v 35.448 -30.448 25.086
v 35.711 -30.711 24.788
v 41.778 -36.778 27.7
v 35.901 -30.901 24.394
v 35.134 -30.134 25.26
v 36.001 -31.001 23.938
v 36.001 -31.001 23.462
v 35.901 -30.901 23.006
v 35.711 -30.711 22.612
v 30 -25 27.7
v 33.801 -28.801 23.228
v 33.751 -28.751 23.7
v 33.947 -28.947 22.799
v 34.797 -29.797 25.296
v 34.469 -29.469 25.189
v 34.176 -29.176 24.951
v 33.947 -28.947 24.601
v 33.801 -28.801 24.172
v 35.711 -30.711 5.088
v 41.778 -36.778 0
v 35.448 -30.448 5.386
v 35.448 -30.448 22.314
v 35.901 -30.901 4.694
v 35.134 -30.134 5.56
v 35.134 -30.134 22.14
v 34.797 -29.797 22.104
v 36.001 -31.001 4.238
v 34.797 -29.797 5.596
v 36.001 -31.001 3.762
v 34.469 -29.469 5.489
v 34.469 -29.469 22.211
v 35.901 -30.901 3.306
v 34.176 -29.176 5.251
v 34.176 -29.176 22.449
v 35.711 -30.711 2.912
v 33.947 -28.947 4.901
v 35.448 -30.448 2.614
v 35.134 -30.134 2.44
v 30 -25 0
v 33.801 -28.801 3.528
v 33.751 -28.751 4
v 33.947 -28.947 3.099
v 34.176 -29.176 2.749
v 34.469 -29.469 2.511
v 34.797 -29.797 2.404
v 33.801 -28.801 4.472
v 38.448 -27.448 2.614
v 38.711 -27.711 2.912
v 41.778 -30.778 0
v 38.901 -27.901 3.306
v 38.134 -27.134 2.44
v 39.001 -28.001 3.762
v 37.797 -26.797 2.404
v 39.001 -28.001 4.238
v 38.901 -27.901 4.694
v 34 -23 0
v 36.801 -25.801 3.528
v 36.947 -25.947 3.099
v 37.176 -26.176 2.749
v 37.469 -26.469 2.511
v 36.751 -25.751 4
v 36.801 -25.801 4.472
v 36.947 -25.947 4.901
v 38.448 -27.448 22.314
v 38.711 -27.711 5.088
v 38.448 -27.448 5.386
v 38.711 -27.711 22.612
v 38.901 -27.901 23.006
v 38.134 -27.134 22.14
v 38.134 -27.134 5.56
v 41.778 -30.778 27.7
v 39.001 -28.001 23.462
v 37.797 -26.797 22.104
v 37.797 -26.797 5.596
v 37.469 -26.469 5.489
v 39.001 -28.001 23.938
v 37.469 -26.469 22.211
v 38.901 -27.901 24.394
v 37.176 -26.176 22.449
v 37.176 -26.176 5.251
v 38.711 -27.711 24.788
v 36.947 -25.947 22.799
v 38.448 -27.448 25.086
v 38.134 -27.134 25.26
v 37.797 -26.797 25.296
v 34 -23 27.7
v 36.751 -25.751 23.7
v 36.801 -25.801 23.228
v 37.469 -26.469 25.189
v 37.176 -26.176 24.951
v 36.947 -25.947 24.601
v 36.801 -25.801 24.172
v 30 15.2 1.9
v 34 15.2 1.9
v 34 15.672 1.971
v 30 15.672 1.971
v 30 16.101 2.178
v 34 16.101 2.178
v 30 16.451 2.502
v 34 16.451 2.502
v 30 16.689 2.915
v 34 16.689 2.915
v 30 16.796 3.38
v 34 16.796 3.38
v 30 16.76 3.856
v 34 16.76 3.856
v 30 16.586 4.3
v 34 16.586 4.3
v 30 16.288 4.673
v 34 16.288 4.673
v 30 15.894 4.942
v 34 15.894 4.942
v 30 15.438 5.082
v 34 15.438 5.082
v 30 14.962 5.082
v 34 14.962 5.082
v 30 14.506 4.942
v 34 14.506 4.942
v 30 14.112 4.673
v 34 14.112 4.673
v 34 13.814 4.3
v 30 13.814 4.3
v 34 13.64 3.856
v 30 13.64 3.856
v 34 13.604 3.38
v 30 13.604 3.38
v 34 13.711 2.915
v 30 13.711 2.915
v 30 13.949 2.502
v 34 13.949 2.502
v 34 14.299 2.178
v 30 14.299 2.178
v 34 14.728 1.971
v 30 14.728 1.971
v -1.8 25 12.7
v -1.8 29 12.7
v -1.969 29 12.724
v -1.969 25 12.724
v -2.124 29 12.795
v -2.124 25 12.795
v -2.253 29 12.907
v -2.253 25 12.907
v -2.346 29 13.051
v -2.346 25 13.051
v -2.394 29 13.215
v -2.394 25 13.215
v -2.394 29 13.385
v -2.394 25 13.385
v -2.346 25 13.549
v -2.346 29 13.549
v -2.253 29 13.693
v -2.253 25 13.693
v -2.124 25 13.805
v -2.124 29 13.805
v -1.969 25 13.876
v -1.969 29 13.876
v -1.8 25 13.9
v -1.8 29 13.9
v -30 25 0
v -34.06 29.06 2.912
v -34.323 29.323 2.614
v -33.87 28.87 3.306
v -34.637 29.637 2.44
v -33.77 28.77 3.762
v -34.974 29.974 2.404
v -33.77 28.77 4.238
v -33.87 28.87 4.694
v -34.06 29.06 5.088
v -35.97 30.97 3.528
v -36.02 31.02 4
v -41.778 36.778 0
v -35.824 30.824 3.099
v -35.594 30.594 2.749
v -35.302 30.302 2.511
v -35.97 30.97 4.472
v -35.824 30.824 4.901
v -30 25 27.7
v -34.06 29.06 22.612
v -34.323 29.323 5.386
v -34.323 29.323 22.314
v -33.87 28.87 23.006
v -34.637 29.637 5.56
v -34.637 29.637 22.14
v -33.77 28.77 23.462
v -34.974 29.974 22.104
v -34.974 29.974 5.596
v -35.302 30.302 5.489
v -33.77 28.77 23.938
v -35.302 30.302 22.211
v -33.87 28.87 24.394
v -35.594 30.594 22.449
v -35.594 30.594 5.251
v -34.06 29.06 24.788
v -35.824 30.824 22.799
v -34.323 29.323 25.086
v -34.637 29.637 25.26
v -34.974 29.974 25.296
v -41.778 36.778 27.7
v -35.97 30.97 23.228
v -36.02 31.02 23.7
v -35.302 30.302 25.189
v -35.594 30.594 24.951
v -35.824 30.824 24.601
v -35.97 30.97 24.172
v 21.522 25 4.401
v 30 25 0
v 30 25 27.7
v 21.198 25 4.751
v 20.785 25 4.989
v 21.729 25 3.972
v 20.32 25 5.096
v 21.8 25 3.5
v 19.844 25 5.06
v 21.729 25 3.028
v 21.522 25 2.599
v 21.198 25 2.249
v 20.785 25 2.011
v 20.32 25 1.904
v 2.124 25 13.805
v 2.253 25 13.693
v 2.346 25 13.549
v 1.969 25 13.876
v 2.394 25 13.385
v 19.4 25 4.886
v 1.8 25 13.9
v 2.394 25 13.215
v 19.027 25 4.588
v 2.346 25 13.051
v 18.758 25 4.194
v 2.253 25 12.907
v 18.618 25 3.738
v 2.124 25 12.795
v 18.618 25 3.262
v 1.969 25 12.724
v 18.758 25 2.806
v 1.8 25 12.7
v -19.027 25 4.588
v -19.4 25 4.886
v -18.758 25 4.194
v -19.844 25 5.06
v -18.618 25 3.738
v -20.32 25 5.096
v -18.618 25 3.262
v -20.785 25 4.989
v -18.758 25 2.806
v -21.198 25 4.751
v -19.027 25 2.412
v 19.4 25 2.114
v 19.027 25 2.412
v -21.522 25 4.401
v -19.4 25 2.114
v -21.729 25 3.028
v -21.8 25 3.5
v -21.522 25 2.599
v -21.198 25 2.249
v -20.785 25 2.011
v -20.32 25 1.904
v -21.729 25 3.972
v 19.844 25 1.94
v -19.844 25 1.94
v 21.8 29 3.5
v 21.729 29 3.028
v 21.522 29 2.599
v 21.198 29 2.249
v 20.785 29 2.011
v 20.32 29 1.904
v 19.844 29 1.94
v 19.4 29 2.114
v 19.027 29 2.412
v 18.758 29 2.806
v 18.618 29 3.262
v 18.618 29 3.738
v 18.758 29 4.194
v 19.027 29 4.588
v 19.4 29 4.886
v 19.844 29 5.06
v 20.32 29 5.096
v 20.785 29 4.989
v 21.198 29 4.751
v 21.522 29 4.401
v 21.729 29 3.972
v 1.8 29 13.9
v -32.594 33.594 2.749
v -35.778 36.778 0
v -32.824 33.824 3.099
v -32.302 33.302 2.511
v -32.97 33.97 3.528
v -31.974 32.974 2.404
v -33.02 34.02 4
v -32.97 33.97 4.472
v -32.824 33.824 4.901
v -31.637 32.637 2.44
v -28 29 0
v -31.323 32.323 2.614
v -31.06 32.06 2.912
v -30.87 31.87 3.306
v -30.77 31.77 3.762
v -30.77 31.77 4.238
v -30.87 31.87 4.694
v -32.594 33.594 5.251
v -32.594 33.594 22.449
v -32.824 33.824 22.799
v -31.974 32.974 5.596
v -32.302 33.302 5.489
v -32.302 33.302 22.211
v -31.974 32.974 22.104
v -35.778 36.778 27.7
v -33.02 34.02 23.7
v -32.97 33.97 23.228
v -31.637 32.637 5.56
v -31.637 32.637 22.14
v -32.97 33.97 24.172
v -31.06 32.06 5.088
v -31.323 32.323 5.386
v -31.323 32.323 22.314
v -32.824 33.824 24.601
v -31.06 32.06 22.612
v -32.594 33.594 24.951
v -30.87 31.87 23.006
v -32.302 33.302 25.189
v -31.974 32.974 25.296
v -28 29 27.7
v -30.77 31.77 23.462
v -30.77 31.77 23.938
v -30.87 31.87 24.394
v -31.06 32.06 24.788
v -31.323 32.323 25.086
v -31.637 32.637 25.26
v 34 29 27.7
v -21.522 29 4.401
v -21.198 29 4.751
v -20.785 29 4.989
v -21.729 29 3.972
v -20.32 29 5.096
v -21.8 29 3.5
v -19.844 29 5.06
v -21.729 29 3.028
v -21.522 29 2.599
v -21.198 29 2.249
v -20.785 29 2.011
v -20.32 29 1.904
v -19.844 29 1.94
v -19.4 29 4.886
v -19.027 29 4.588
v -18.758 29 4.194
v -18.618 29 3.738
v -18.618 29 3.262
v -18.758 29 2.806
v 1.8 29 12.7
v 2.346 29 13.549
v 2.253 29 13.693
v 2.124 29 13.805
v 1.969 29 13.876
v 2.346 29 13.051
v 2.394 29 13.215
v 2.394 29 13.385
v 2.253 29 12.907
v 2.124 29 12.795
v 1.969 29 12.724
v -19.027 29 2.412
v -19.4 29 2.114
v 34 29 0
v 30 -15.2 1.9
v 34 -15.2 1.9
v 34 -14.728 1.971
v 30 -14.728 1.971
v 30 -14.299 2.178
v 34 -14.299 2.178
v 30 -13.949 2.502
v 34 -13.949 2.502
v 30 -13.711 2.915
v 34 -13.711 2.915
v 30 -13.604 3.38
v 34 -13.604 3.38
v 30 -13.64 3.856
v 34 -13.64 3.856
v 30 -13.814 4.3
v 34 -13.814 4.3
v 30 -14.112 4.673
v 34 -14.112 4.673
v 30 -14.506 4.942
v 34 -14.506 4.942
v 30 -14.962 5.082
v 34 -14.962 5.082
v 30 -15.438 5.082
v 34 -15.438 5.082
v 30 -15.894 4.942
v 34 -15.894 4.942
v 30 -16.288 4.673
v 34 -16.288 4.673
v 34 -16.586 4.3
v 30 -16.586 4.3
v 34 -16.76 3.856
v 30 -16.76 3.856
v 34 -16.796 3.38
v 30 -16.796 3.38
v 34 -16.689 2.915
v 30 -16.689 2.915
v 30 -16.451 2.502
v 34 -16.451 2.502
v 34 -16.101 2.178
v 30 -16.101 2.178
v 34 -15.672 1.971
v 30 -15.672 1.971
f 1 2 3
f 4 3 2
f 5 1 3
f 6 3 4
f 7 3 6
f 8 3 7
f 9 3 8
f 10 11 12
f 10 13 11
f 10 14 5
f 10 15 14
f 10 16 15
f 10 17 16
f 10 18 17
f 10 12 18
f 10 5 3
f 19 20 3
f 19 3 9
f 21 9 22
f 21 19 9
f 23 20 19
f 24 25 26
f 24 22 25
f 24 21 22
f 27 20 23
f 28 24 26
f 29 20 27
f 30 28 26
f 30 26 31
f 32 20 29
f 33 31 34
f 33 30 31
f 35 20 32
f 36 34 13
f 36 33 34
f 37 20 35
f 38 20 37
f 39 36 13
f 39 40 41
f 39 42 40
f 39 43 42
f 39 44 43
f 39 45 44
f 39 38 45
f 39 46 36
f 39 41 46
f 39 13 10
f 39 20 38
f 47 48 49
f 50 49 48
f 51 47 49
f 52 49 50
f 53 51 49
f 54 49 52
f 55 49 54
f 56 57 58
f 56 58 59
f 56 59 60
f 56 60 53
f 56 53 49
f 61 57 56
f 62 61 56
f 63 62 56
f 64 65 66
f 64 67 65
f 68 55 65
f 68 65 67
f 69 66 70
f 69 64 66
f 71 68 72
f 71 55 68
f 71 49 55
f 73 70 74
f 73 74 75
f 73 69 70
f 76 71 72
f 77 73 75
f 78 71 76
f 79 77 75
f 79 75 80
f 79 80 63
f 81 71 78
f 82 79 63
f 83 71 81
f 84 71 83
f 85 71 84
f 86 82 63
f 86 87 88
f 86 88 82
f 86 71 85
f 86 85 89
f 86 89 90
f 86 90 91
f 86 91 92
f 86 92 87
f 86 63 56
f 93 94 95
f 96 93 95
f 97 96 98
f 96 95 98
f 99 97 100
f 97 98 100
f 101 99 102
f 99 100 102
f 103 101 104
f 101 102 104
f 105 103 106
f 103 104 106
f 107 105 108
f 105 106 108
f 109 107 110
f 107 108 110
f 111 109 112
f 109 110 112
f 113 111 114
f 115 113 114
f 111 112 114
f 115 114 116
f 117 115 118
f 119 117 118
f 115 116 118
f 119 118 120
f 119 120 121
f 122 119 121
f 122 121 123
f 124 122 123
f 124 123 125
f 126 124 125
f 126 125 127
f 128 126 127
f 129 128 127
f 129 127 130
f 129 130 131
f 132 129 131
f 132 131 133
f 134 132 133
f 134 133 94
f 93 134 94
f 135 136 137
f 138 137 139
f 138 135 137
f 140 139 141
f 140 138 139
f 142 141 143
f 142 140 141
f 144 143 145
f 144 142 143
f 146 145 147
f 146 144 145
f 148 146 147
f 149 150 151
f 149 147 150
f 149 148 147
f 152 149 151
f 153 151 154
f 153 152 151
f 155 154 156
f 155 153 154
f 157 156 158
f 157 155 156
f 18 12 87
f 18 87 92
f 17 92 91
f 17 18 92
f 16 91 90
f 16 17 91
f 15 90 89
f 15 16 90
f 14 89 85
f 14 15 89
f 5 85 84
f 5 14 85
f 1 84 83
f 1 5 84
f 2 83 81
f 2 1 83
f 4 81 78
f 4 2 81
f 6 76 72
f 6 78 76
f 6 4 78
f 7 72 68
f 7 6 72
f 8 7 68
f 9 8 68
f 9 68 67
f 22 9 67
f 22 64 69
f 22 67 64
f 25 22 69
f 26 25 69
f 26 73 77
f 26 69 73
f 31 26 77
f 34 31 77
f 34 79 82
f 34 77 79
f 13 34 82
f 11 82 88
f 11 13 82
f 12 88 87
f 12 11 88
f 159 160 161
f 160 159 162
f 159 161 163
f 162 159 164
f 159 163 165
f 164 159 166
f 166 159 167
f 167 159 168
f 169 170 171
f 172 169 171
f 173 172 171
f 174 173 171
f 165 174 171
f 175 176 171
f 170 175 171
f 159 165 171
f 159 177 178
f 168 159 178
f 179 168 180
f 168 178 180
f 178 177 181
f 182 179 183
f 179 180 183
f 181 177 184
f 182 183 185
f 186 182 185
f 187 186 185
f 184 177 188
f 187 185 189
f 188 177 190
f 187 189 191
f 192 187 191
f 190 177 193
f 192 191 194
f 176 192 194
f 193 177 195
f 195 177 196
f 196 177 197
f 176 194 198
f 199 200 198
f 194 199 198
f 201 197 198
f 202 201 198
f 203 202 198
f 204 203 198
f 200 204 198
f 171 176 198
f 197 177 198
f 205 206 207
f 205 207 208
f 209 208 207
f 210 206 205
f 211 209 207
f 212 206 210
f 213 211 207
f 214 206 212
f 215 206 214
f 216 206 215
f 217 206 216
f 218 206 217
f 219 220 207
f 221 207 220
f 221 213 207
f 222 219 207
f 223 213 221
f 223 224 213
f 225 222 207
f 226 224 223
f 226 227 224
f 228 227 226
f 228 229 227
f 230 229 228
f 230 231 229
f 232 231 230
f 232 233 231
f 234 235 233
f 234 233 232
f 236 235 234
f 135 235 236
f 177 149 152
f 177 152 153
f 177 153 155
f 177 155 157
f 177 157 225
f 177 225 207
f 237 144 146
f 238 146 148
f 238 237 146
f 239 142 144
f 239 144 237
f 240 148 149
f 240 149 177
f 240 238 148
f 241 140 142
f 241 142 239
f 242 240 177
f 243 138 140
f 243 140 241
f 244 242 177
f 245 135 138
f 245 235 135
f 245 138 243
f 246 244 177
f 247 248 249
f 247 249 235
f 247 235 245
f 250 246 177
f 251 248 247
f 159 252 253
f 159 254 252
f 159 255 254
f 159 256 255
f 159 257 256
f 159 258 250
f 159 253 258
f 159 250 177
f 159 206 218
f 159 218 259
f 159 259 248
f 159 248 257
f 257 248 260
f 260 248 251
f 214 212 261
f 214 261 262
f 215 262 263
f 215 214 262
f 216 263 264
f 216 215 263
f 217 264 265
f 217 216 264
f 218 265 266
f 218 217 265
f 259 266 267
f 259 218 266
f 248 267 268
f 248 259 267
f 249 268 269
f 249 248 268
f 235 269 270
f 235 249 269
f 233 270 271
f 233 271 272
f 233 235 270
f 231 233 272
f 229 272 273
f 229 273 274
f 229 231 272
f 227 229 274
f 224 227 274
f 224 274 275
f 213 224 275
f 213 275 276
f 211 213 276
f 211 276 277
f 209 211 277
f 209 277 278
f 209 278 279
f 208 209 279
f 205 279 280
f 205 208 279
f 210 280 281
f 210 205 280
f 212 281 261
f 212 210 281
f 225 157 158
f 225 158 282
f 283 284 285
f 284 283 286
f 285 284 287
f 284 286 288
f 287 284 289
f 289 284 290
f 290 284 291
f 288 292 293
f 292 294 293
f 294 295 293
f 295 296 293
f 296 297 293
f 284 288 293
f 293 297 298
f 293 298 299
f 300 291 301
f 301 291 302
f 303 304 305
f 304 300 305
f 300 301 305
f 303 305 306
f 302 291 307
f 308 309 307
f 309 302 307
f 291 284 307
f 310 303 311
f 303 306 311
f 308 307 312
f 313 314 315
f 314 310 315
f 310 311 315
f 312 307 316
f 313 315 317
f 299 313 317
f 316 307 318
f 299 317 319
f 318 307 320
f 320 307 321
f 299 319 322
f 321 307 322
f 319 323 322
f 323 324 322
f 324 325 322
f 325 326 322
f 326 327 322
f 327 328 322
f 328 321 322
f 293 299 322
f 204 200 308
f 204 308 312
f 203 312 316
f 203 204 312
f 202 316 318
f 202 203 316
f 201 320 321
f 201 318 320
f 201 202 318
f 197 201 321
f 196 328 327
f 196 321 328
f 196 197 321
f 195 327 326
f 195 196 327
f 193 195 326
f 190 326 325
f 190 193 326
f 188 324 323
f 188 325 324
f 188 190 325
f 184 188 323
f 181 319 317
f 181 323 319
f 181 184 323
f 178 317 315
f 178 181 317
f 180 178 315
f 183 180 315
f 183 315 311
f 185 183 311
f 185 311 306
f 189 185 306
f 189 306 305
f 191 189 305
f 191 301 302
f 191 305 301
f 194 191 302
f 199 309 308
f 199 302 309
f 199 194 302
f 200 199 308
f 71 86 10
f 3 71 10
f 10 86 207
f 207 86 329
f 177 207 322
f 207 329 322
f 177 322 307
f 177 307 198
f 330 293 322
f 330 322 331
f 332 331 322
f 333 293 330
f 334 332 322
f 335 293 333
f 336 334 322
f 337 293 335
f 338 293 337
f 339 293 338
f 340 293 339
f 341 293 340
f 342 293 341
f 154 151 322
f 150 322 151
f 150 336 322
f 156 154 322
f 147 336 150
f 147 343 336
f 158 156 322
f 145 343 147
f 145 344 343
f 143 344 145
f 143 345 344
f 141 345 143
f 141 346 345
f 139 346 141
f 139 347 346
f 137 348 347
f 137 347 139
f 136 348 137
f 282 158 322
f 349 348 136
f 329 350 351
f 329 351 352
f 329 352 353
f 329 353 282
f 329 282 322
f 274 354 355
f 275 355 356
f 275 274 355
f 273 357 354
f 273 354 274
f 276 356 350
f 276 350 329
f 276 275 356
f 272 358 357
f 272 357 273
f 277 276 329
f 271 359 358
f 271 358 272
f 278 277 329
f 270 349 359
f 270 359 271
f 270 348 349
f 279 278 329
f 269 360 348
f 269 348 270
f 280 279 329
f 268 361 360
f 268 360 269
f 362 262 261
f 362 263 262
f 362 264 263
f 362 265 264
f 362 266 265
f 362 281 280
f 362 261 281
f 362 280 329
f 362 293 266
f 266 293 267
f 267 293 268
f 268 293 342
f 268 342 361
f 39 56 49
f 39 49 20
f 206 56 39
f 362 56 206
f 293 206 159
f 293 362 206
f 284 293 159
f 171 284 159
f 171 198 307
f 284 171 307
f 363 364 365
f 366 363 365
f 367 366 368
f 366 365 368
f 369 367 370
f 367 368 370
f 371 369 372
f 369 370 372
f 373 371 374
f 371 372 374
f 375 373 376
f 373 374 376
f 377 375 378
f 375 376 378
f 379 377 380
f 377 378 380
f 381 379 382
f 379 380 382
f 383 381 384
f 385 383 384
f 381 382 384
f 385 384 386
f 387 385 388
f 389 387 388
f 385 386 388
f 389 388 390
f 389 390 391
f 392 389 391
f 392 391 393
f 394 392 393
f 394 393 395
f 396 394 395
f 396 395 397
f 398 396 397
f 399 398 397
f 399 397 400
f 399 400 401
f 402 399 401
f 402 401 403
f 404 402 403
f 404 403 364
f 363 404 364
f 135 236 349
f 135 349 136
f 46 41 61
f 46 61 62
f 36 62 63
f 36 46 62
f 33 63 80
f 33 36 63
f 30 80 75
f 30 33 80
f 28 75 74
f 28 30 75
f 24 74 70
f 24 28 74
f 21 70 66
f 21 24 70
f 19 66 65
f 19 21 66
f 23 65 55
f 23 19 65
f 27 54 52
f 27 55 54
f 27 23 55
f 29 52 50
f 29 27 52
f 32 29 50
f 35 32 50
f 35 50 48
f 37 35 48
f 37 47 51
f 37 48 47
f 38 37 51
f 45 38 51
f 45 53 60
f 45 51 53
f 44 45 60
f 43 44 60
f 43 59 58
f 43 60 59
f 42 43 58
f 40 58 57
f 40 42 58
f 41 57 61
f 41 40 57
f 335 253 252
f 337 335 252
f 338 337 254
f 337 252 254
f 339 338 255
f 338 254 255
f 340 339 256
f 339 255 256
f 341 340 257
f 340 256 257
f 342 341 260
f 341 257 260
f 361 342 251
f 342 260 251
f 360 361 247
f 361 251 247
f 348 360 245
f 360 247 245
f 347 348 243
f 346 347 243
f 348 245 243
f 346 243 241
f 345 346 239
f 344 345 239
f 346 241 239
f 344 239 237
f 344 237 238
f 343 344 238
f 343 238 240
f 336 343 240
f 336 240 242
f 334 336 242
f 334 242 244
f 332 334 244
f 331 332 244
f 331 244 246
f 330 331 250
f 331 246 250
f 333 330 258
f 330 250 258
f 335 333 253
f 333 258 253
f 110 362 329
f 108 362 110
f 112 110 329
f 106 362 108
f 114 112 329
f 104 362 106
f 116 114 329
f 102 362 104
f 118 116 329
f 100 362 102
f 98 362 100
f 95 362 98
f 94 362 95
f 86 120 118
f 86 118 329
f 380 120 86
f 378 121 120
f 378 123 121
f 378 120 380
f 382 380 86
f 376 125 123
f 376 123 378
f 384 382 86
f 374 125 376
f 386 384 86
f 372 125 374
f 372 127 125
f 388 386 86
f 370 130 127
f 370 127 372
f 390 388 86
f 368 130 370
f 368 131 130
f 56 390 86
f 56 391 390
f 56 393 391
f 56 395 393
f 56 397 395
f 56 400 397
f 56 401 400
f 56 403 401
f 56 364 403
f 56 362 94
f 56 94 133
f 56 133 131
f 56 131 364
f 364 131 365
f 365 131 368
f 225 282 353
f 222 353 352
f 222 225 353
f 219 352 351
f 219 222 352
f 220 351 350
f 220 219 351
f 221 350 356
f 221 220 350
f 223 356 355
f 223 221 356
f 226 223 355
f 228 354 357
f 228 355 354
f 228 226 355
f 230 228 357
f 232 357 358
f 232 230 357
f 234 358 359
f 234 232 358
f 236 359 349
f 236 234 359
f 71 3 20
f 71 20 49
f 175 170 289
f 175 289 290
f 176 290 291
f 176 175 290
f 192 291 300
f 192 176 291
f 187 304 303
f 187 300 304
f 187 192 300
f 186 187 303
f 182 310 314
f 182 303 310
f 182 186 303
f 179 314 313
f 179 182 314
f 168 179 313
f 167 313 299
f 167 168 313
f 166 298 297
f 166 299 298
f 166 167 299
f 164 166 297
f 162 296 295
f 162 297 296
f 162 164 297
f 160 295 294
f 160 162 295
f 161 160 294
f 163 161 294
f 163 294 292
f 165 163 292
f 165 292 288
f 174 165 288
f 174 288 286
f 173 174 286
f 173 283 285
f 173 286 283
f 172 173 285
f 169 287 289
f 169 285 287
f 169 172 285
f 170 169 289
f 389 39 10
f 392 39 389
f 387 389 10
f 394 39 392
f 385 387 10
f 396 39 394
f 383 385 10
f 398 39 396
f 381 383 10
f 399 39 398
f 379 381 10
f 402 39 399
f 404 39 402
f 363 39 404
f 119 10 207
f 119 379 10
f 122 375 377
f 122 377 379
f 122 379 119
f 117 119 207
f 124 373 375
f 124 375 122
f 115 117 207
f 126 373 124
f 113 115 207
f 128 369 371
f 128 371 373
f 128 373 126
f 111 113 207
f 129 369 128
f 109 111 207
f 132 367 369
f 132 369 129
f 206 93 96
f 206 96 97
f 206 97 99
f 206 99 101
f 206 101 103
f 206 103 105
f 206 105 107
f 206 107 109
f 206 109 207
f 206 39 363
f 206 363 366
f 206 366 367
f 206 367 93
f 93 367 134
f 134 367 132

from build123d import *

# Parameters (mm, degrees)
BOSS_EXTRUDE1_DEPTH     = 27.7
SKETCH2_R               = 1.6
CUT_EXTRUDE1_DEPTH      = 6.4
MIRROR1_START           = 25
MIRROR1_OUTLINE_R       = 1.6
MIRROR1_DEPTH           = 4
BOSS_EXTRUDE2_DEPTH     = 27.7
CUT_EXTRUDE2_DEPTH      = 8
CUT_EXTRUDE2_DEPTH_BACK = 8
SKETCH4_R               = 1.6
CUT_EXTRUDE3_DEPTH      = 8


# Read off the part's stored shape, not the designer's step: Mirror1
with BuildPart() as part:
    # Sketch1 → Boss-Extrude1 (new body)
    with BuildSketch(Plane.XY):
        Polygon((-34, 29), (34, 29), (34, -29), (30, -25), (30, 25), (-30, 25), align=None)
    extrude(amount=BOSS_EXTRUDE1_DEPTH)

    # Sketch2 → Cut-Extrude1 (cut)
    with BuildSketch(Plane(origin=(34, 0, 0), x_dir=(0, 0, -1), z_dir=(1, 0, 0))):
        with Locations((-3.5, -15.2)):
            Circle(SKETCH2_R)
        with Locations((-3.5, 15.2)):
            Circle(SKETCH2_R)
    extrude(amount=-CUT_EXTRUDE1_DEPTH, mode=Mode.SUBTRACT)

    # Mirror1 outline → Mirror1 (cut)
    with BuildSketch(Plane(origin=(0, 0, 0), x_dir=(1, 0, 0), z_dir=(0, 1, 0)).offset(MIRROR1_START)):
        with Locations((20.2, -3.5)):
            Circle(MIRROR1_OUTLINE_R)
    mirror1 = extrude(amount=MIRROR1_DEPTH, mode=Mode.SUBTRACT)

    # Mirror2: Mirror1 across plane
    add(mirror1.mirror(Plane(origin=(0, 0, 0), x_dir=(0, 0, 1), z_dir=(1, 0, 0))), mode=Mode.SUBTRACT)

    # Sketch3 → Boss-Extrude2 (add)
    with BuildSketch(Plane.XY.offset(27.7)):
        Polygon((-34, 29), (-41.778174593, 36.778174593), (-35.778174593, 36.778174593), (-28, 29), align=None)
        Polygon((34, -29), (41.778174593, -36.778174593), (41.778174593, -30.778174593), (34, -23), align=None)
    extrude(amount=-BOSS_EXTRUDE2_DEPTH)

    # Sketch4 → Cut-Extrude2 (cut, two sides: drawn at the far end of the back side and taken through both)
    with BuildSketch(Plane(origin=(0.5, 0.5, 0), x_dir=(0, 0, -1), z_dir=(0.7071067811865475, 0.7071067811865477, 0)).offset(-CUT_EXTRUDE2_DEPTH_BACK)):
        with Locations(Location((-4, 45.805086528, 0), (0, 0, 90))):
            Circle(SKETCH4_R)
        with Locations(Location((-23.7, 45.805086528, 0), (0, 0, 90))):
            Circle(SKETCH4_R)
        with Locations(Location((-23.7, -45.794913472, 0), (0, 0, 90))):
            Circle(SKETCH4_R)
        with Locations(Location((-4, -45.794913472, 0), (0, 0, 90))):
            Circle(SKETCH4_R)
    extrude(amount=CUT_EXTRUDE2_DEPTH + CUT_EXTRUDE2_DEPTH_BACK, mode=Mode.SUBTRACT)

    # Sketch5 → Cut-Extrude3 (cut)
    with BuildSketch(Plane.XZ.offset(-25)):
        with BuildLine():
            Line((-1.8, 13.9), (1.8, 13.9))
            ThreePointArc((1.8, 13.9), (2.4, 13.3), (1.8, 12.7))
            Line((1.8, 12.7), (-1.8, 12.7))
            ThreePointArc((-1.8, 12.7), (-2.4, 13.3), (-1.8, 13.9))
        make_face()
    extrude(amount=-CUT_EXTRUDE3_DEPTH, mode=Mode.SUBTRACT)


solid = part.part
